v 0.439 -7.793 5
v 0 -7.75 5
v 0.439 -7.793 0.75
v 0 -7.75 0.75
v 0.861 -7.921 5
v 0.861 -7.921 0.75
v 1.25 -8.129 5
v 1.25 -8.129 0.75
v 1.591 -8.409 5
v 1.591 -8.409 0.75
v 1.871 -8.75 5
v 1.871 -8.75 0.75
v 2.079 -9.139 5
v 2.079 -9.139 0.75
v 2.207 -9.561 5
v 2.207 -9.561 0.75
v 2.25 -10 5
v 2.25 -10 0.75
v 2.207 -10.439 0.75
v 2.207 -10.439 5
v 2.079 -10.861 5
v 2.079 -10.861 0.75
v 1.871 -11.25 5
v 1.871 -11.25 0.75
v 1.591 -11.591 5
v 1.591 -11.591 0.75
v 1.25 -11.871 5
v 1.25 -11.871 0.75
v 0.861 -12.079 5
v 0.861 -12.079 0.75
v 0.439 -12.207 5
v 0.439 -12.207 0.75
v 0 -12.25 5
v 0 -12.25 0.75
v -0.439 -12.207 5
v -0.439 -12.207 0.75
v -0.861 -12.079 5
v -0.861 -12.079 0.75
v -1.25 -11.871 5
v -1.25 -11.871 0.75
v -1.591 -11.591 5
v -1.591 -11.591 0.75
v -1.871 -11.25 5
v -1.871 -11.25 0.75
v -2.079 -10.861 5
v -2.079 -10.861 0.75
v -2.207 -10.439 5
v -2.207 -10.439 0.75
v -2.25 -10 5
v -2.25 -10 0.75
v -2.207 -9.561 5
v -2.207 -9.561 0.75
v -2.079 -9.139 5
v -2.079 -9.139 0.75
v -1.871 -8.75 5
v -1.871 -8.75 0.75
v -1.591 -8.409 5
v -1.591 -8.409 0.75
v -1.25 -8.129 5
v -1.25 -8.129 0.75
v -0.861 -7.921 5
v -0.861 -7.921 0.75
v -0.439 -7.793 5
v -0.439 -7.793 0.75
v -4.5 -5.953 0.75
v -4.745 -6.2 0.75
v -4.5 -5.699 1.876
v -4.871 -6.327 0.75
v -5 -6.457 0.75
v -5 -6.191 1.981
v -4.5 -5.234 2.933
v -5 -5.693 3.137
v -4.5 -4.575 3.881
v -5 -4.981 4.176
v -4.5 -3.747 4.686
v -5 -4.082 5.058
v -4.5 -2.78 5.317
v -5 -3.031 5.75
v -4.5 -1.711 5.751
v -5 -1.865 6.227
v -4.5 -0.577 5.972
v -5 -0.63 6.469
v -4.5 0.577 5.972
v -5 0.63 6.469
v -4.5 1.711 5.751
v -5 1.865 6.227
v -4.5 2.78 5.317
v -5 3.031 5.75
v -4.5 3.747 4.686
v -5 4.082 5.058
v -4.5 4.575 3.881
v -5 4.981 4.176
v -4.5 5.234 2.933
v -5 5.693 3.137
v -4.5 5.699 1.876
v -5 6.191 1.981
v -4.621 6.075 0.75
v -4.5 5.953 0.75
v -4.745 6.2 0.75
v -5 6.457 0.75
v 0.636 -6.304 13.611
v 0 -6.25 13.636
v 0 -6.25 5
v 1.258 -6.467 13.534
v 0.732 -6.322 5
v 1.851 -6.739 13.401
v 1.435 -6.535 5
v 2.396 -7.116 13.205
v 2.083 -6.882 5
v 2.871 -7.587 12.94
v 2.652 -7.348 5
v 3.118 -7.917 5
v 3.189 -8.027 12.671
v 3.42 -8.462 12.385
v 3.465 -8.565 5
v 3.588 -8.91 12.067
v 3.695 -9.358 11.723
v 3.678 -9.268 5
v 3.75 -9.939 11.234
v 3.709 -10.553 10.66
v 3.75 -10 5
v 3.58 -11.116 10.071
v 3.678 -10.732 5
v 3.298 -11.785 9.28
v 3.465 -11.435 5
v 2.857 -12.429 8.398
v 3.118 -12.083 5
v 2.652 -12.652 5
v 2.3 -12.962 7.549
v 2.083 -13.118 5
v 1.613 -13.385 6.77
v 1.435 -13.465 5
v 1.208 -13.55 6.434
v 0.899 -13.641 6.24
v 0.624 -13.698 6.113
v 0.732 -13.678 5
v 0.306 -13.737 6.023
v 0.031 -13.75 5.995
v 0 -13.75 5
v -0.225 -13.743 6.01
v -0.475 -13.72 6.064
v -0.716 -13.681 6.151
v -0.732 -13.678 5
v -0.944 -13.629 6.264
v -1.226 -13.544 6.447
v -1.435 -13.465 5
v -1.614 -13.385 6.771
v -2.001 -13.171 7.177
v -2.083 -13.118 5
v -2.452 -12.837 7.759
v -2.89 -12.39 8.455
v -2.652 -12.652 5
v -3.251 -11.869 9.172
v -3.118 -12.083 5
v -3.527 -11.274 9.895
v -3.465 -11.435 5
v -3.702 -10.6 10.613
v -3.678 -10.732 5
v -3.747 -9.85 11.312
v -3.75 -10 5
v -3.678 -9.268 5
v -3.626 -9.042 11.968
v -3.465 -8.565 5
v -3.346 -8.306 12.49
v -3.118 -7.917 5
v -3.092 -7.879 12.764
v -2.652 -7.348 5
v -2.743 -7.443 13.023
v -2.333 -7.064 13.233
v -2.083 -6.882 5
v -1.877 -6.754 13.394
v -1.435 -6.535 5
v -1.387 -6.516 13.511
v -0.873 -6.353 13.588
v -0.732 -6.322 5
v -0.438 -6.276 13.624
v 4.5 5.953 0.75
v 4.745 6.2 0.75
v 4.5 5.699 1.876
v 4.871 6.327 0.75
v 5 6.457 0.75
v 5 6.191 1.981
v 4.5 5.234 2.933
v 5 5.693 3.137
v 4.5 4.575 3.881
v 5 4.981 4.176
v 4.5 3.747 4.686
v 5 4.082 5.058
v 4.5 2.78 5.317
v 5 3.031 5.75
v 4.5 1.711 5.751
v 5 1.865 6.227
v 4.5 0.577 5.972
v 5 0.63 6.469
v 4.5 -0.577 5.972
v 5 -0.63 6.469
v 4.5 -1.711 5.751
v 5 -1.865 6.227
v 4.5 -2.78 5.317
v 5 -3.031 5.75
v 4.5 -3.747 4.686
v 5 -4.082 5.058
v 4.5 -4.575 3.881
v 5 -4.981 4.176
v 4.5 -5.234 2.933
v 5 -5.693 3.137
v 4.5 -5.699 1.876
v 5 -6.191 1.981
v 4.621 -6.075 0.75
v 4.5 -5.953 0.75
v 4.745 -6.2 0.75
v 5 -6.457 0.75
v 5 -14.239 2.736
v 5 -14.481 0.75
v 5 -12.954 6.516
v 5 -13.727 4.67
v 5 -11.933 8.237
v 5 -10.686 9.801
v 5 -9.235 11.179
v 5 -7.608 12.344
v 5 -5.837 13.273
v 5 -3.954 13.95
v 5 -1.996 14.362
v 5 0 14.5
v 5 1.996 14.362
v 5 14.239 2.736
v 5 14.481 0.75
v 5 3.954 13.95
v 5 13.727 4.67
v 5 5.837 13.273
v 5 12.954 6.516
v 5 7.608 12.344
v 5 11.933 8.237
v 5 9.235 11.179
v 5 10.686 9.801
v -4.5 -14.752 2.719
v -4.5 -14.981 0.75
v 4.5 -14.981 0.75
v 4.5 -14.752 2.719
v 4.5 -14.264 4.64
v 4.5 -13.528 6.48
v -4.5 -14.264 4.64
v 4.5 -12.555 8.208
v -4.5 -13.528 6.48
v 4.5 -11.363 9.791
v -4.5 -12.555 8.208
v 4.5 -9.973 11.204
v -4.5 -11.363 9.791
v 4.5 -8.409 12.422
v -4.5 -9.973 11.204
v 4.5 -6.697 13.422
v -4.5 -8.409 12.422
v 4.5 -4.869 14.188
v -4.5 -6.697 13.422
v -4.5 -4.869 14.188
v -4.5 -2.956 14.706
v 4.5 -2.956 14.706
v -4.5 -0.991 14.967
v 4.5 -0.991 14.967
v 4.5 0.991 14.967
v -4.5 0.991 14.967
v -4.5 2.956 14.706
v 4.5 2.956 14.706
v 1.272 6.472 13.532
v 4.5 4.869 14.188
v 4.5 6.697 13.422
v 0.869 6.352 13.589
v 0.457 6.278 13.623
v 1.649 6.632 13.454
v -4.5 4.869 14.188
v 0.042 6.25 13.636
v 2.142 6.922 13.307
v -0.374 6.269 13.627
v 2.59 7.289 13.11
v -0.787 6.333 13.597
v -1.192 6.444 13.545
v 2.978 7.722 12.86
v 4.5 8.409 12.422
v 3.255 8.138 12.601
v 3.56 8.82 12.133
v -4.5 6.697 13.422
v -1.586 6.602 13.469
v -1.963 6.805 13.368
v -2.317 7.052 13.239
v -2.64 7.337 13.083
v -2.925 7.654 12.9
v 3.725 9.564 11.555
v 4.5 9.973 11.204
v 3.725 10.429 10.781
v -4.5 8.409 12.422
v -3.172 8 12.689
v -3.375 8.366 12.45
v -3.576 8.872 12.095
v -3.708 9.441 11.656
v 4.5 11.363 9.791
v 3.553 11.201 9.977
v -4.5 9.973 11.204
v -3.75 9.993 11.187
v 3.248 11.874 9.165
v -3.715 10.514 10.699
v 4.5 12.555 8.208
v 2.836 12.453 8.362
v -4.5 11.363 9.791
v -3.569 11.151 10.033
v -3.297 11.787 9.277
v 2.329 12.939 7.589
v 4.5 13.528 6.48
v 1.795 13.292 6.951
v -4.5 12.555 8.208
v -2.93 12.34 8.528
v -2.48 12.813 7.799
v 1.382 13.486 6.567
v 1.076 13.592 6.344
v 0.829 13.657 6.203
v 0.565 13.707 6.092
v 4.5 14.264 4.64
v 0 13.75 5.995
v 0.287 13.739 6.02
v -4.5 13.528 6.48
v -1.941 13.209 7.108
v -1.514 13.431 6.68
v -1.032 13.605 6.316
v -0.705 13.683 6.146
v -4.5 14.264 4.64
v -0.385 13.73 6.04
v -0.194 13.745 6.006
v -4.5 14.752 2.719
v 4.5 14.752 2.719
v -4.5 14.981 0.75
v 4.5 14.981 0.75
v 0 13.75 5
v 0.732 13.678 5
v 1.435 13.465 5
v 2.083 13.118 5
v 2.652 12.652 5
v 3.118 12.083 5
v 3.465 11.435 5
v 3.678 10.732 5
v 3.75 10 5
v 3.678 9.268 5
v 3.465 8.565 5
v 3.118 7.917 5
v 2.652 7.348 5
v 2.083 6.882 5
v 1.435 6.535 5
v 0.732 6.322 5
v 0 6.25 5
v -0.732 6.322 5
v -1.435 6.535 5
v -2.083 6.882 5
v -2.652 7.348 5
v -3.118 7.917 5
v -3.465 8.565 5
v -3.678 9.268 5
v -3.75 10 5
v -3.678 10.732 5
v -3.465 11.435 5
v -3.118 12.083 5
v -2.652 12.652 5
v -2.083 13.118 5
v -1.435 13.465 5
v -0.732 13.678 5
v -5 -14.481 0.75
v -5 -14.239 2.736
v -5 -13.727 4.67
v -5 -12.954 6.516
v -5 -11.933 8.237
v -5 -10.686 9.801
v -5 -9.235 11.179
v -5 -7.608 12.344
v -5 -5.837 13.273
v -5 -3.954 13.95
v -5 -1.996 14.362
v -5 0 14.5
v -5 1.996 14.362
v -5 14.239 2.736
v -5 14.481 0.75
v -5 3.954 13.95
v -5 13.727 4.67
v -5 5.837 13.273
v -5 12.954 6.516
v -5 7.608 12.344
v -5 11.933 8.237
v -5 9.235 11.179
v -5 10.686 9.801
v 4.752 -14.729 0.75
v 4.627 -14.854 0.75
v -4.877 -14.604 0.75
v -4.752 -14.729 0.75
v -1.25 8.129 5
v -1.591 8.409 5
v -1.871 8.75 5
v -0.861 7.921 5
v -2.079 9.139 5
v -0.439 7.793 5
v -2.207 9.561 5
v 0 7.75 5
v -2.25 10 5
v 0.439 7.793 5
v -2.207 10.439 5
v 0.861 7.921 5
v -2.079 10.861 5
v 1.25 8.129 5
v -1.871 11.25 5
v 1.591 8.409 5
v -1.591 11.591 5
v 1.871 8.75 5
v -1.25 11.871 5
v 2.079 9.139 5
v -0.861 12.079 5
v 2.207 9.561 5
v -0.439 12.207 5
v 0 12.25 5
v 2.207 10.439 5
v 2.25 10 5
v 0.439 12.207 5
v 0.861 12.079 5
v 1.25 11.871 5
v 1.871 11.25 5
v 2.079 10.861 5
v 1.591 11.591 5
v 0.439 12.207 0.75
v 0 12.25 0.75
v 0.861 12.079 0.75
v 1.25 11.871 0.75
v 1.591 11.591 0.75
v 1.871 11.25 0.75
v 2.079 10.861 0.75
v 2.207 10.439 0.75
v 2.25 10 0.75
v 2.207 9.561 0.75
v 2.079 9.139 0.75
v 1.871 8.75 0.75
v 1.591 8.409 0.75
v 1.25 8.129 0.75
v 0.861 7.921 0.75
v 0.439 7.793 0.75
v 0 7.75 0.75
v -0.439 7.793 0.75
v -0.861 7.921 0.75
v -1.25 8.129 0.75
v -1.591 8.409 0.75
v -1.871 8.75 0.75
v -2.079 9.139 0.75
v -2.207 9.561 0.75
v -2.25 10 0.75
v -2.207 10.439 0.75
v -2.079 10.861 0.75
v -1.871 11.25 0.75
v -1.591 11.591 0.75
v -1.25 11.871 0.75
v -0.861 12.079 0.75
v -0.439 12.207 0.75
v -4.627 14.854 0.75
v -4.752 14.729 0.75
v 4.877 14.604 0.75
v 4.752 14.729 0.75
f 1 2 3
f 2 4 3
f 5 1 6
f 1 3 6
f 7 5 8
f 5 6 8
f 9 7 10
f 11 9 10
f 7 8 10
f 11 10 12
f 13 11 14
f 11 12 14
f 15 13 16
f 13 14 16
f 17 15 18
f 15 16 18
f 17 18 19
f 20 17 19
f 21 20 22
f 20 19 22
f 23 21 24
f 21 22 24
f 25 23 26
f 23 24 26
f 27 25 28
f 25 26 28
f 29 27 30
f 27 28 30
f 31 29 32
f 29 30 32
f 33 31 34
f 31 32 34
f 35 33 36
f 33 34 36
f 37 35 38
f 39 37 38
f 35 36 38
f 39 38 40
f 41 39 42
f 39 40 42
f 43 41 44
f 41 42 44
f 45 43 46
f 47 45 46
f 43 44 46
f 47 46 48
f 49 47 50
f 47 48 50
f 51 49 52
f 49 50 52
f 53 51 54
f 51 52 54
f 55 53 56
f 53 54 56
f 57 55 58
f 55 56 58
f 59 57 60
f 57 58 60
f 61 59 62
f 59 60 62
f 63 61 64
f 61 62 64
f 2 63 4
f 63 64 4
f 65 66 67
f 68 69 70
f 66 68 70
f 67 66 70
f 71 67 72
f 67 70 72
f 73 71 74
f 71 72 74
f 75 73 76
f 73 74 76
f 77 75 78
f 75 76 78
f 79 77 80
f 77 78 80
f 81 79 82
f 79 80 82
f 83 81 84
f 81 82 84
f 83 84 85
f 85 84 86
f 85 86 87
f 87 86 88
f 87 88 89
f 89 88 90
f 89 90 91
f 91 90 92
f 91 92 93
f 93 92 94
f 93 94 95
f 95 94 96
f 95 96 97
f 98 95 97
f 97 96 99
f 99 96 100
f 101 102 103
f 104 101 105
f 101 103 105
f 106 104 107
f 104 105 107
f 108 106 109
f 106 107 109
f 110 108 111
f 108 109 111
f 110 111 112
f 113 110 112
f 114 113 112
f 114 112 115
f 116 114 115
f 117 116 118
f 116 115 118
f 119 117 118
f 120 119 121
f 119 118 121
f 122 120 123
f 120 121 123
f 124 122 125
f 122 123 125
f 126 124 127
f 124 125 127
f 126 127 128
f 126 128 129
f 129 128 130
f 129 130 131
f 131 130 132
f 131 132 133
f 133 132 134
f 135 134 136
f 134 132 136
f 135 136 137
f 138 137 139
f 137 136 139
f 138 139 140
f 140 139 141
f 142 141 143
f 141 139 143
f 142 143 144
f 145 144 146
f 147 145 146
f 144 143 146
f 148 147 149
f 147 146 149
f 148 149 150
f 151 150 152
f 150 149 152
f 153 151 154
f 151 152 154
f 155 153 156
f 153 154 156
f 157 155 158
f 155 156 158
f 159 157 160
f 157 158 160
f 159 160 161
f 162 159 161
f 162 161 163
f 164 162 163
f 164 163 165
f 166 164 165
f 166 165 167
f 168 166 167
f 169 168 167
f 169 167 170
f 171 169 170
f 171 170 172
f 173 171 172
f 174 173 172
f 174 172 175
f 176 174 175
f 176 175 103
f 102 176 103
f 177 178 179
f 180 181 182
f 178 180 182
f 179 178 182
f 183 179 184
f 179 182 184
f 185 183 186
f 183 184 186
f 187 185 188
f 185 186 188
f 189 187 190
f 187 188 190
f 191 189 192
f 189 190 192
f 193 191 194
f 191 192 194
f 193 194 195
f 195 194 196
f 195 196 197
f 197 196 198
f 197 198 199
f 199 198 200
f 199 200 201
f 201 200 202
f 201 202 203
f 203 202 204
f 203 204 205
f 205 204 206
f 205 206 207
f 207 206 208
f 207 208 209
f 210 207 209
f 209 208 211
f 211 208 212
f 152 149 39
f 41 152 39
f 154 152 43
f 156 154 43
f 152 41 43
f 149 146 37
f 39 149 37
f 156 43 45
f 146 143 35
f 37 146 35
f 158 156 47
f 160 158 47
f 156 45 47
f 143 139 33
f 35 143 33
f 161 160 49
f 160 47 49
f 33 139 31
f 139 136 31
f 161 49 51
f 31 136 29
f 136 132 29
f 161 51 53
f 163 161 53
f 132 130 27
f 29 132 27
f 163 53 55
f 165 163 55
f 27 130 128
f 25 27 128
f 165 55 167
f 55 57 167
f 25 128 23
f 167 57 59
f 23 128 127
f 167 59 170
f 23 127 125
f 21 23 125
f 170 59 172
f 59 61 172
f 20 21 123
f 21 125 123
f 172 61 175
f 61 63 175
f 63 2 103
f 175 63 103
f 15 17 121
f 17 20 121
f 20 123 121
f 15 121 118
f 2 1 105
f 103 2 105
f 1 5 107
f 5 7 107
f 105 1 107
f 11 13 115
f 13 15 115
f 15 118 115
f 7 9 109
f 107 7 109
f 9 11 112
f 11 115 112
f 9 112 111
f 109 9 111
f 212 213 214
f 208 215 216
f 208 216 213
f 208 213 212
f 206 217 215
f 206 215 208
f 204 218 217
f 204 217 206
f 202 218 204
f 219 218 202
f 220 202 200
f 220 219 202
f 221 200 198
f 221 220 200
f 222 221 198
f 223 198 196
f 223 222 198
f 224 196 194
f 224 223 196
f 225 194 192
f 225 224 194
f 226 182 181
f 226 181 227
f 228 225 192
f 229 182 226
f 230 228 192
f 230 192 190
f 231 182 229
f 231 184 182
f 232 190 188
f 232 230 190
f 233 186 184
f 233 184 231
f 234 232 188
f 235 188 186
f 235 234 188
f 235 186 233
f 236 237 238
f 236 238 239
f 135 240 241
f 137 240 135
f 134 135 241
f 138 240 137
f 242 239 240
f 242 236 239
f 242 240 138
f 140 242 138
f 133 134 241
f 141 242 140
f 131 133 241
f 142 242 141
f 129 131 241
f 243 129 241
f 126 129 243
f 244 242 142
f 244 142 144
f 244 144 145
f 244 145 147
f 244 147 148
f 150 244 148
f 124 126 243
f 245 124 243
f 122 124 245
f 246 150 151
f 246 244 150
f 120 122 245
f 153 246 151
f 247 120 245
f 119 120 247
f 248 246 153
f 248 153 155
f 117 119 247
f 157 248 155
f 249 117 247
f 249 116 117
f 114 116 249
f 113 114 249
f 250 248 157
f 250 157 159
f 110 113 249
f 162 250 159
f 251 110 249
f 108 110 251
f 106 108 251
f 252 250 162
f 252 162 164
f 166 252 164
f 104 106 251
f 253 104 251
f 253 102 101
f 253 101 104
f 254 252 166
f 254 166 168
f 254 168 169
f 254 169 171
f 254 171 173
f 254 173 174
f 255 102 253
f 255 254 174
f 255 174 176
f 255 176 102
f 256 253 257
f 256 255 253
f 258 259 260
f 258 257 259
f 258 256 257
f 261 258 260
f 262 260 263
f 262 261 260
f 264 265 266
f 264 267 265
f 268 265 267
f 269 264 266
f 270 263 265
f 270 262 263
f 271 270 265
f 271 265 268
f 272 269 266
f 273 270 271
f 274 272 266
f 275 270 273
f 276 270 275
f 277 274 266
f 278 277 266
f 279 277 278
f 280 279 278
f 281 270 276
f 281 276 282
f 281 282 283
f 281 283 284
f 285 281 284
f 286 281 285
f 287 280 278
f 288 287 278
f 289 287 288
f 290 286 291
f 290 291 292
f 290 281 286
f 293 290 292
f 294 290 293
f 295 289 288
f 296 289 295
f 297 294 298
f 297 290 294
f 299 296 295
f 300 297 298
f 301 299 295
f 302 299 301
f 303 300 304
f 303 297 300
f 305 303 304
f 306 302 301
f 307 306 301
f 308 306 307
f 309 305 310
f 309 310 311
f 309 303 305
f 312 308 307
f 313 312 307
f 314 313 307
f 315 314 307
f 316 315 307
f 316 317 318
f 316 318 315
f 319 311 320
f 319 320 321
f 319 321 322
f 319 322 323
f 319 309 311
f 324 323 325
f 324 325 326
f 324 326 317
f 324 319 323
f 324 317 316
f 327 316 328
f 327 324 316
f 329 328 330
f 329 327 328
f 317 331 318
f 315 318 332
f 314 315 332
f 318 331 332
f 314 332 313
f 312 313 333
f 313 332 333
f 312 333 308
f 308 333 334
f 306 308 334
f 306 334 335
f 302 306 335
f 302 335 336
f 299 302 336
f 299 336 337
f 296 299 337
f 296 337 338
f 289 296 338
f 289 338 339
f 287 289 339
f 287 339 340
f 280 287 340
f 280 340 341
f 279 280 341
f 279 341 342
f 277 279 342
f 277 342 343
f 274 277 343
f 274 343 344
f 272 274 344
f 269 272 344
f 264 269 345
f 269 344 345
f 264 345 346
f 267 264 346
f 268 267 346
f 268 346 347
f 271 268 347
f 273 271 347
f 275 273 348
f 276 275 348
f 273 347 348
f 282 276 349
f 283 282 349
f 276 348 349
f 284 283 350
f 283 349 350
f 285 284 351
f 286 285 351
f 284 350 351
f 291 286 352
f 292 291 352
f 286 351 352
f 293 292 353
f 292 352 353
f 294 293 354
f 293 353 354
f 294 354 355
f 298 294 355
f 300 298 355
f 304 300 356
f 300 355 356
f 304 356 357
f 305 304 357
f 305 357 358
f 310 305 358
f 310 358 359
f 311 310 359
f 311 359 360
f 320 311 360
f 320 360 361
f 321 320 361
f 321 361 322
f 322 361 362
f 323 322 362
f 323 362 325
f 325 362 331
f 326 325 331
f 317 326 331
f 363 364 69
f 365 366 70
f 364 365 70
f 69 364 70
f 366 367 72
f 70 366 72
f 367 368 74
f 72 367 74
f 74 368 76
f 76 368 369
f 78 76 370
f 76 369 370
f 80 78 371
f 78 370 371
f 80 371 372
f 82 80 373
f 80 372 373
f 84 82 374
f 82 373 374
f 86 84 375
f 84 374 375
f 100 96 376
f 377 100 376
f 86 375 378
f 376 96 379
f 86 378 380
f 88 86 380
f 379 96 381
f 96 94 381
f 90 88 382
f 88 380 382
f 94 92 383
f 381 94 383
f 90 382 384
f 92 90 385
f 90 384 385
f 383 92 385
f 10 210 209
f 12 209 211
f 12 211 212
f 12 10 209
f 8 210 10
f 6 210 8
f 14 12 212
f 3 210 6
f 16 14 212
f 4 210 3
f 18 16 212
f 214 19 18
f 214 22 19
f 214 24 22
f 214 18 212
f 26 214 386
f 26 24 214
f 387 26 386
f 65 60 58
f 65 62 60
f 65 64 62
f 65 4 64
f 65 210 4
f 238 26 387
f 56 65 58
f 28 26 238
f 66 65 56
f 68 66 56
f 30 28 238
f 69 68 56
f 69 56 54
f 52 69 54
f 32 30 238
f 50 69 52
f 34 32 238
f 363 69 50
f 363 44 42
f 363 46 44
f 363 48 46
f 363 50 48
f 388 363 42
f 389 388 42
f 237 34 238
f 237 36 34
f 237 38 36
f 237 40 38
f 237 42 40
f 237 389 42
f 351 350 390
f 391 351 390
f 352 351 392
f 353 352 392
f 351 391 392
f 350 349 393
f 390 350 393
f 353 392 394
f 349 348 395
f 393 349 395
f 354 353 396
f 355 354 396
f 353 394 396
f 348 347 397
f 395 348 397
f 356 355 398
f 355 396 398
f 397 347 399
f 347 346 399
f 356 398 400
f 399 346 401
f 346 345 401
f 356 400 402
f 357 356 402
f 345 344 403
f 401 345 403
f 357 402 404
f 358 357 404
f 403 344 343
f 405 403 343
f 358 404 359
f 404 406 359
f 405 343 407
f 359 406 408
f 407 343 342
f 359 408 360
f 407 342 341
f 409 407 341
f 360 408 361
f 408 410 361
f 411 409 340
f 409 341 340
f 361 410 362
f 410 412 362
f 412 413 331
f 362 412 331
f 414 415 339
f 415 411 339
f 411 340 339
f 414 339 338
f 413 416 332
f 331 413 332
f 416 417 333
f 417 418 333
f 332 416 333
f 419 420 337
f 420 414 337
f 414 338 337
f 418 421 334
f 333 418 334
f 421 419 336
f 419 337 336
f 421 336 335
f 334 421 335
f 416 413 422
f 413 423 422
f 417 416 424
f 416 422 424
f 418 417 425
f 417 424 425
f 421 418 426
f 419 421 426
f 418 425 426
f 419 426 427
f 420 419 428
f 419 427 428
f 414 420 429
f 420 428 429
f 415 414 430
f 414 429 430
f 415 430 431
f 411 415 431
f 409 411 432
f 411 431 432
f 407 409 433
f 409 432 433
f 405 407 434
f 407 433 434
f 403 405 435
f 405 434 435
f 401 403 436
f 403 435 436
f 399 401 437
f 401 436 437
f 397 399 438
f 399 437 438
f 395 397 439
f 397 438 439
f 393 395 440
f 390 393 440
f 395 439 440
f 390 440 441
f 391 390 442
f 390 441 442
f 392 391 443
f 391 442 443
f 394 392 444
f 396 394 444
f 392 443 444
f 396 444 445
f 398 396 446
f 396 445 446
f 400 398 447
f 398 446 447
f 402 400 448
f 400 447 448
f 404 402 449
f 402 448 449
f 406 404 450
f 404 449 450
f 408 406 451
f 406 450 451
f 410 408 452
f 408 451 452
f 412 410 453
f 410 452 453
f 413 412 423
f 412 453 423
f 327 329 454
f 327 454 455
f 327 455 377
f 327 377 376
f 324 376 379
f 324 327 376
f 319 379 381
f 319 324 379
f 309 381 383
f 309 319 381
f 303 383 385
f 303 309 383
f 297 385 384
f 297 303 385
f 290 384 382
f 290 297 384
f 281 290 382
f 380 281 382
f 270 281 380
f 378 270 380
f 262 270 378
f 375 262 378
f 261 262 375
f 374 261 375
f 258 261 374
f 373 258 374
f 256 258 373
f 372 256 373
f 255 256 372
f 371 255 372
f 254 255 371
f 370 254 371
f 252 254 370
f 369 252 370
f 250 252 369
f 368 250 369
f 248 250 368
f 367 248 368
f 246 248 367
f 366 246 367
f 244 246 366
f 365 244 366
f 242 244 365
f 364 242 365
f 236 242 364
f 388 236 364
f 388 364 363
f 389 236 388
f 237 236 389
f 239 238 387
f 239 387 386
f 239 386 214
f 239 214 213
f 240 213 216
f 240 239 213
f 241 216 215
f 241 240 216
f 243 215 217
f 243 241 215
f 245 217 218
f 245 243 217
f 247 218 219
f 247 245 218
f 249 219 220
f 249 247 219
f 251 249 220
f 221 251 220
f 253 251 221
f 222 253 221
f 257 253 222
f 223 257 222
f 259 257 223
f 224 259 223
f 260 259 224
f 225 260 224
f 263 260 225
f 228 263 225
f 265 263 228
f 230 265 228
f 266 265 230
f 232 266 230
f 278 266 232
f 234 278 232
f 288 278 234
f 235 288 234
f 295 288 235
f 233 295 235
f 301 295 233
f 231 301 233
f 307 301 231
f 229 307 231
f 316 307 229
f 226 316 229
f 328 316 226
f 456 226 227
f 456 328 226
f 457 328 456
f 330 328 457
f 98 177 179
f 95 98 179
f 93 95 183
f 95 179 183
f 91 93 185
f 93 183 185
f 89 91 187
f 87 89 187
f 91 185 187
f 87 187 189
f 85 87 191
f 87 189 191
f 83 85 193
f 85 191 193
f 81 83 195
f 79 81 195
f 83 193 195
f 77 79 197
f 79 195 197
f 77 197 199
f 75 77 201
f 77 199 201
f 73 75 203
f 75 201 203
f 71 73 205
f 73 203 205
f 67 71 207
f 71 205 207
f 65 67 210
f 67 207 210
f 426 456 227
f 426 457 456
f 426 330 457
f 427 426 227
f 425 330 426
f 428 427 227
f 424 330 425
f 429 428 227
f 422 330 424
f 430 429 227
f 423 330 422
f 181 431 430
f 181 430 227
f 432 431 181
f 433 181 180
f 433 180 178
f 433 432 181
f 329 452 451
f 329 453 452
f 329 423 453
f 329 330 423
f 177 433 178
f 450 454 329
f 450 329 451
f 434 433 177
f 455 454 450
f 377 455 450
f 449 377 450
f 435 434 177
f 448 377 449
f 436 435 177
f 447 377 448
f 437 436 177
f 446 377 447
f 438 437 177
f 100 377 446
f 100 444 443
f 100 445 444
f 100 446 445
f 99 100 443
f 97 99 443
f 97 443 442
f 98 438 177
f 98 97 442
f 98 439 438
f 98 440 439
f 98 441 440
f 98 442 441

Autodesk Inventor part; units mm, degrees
sketch "Sketch_1" plane through (0, 0, 0) normal (0, 0, 1) x (1, 0, 0)
  line L0 (5, 0) -> (-5, 0)
  line L1 (-5, 14.5) -> (-5, 6.5)
  line L2 (-5, 6.5) -> (-4.5, 6)
  line L3 (-4.5, 6) -> (4.5, 6)
  line L4 (4.5, 6) -> (5, 6.5)
  line L5 (5, 6.5) -> (5, 14.5)
  line L6 (5, 14.5) -> (4.5, 15)
  line L7 (4.5, 15) -> (-4.5, 15)
  line L8 (-4.5, 15) -> (-5, 14.5)
revolve "Revolution1" add sketch "Sketch_1" angle 180 about axis through (5, 0, 0) along (1, 0, 0)
sketch "Sketch_2" plane through (0, 0, 0) normal (1, 0, 0) x (0, 1, 0)
  line L0 (-15, 0.75) -> (-15, -0.75)
  line L1 (-15, -0.75) -> (15, -0.75)
  line L2 (15, -0.75) -> (15, 0.75)
  line L3 (15, 0.75) -> (-15, 0.75)
extrude "Extrusion1" cut sketch "Sketch_2" along normal mid plane 10
sketch "Sketch_3" plane through (0, 0, 0) normal (1, 0, 0) x (0, 1, 0)
  line L0 (-10, 0) -> (-10, 15)
  line L1 (-10, 15) -> (-6.25, 15)
  line L2 (-6.25, 15) -> (-6.25, 5)
  line L3 (-6.25, 5) -> (-7.75, 5)
  line L4 (-7.75, 5) -> (-7.75, 0)
  line L5 (-7.75, 0) -> (-10, 0)
  line L6 (-10, 0) -> (-10, 15)
revolve "Revolution2" cut sketch "Sketch_3" angle 360 about axis through (0, -10, 0) along (0, 0, -1)
sketch "Sketch_4" plane through (0, 0, 0) normal (1, 0, 0) x (0, 1, 0)
  line L0 (10, 0) -> (10, 15)
  line L1 (10, 15) -> (13.75, 15)
  line L2 (13.75, 15) -> (13.75, 5)
  line L3 (13.75, 5) -> (12.25, 5)
  line L4 (12.25, 5) -> (12.25, 0)
  line L5 (12.25, 0) -> (10, 0)
  line L6 (10, 0) -> (10, 15)
revolve "Revolution3" cut sketch "Sketch_4" angle 360 about axis through (0, 10, 0) along (0, 0, -1)
ref_plane "1_2_XY" through (0, 0, 0) normal (0, 0, 1) x (1, 0, 0)
ref_plane "1_2_YZ" through (0, 0, 0) normal (1, 0, 0) x (0, 1, 0)
ref_plane "1_2_ZX" through (0, 0, 0) normal (0, 1, 0) x (0, 0, 1)
ref_plane "body_screw_XY" through (0, -10, 5) normal (0, 0, 1) x (1, 0, 0)
ref_plane "body_screw_YZ" through (0, -10, 5) normal (1, 0, 0) x (0, 1, 0)
ref_plane "body_screw_ZX" through (0, -10, 5) normal (0, 1, 0) x (0, 0, 1)
ref_plane "body_screw2_XY" through (0, 10, 5) normal (0, 0, 1) x (1, 0, 0)
ref_plane "body_screw2_YZ" through (0, 10, 5) normal (1, 0, 0) x (0, 1, 0)
ref_plane "body_screw2_ZX" through (0, 10, 5) normal (0, 1, 0) x (0, 0, 1)
properties part number "SSCSP12-10b"
